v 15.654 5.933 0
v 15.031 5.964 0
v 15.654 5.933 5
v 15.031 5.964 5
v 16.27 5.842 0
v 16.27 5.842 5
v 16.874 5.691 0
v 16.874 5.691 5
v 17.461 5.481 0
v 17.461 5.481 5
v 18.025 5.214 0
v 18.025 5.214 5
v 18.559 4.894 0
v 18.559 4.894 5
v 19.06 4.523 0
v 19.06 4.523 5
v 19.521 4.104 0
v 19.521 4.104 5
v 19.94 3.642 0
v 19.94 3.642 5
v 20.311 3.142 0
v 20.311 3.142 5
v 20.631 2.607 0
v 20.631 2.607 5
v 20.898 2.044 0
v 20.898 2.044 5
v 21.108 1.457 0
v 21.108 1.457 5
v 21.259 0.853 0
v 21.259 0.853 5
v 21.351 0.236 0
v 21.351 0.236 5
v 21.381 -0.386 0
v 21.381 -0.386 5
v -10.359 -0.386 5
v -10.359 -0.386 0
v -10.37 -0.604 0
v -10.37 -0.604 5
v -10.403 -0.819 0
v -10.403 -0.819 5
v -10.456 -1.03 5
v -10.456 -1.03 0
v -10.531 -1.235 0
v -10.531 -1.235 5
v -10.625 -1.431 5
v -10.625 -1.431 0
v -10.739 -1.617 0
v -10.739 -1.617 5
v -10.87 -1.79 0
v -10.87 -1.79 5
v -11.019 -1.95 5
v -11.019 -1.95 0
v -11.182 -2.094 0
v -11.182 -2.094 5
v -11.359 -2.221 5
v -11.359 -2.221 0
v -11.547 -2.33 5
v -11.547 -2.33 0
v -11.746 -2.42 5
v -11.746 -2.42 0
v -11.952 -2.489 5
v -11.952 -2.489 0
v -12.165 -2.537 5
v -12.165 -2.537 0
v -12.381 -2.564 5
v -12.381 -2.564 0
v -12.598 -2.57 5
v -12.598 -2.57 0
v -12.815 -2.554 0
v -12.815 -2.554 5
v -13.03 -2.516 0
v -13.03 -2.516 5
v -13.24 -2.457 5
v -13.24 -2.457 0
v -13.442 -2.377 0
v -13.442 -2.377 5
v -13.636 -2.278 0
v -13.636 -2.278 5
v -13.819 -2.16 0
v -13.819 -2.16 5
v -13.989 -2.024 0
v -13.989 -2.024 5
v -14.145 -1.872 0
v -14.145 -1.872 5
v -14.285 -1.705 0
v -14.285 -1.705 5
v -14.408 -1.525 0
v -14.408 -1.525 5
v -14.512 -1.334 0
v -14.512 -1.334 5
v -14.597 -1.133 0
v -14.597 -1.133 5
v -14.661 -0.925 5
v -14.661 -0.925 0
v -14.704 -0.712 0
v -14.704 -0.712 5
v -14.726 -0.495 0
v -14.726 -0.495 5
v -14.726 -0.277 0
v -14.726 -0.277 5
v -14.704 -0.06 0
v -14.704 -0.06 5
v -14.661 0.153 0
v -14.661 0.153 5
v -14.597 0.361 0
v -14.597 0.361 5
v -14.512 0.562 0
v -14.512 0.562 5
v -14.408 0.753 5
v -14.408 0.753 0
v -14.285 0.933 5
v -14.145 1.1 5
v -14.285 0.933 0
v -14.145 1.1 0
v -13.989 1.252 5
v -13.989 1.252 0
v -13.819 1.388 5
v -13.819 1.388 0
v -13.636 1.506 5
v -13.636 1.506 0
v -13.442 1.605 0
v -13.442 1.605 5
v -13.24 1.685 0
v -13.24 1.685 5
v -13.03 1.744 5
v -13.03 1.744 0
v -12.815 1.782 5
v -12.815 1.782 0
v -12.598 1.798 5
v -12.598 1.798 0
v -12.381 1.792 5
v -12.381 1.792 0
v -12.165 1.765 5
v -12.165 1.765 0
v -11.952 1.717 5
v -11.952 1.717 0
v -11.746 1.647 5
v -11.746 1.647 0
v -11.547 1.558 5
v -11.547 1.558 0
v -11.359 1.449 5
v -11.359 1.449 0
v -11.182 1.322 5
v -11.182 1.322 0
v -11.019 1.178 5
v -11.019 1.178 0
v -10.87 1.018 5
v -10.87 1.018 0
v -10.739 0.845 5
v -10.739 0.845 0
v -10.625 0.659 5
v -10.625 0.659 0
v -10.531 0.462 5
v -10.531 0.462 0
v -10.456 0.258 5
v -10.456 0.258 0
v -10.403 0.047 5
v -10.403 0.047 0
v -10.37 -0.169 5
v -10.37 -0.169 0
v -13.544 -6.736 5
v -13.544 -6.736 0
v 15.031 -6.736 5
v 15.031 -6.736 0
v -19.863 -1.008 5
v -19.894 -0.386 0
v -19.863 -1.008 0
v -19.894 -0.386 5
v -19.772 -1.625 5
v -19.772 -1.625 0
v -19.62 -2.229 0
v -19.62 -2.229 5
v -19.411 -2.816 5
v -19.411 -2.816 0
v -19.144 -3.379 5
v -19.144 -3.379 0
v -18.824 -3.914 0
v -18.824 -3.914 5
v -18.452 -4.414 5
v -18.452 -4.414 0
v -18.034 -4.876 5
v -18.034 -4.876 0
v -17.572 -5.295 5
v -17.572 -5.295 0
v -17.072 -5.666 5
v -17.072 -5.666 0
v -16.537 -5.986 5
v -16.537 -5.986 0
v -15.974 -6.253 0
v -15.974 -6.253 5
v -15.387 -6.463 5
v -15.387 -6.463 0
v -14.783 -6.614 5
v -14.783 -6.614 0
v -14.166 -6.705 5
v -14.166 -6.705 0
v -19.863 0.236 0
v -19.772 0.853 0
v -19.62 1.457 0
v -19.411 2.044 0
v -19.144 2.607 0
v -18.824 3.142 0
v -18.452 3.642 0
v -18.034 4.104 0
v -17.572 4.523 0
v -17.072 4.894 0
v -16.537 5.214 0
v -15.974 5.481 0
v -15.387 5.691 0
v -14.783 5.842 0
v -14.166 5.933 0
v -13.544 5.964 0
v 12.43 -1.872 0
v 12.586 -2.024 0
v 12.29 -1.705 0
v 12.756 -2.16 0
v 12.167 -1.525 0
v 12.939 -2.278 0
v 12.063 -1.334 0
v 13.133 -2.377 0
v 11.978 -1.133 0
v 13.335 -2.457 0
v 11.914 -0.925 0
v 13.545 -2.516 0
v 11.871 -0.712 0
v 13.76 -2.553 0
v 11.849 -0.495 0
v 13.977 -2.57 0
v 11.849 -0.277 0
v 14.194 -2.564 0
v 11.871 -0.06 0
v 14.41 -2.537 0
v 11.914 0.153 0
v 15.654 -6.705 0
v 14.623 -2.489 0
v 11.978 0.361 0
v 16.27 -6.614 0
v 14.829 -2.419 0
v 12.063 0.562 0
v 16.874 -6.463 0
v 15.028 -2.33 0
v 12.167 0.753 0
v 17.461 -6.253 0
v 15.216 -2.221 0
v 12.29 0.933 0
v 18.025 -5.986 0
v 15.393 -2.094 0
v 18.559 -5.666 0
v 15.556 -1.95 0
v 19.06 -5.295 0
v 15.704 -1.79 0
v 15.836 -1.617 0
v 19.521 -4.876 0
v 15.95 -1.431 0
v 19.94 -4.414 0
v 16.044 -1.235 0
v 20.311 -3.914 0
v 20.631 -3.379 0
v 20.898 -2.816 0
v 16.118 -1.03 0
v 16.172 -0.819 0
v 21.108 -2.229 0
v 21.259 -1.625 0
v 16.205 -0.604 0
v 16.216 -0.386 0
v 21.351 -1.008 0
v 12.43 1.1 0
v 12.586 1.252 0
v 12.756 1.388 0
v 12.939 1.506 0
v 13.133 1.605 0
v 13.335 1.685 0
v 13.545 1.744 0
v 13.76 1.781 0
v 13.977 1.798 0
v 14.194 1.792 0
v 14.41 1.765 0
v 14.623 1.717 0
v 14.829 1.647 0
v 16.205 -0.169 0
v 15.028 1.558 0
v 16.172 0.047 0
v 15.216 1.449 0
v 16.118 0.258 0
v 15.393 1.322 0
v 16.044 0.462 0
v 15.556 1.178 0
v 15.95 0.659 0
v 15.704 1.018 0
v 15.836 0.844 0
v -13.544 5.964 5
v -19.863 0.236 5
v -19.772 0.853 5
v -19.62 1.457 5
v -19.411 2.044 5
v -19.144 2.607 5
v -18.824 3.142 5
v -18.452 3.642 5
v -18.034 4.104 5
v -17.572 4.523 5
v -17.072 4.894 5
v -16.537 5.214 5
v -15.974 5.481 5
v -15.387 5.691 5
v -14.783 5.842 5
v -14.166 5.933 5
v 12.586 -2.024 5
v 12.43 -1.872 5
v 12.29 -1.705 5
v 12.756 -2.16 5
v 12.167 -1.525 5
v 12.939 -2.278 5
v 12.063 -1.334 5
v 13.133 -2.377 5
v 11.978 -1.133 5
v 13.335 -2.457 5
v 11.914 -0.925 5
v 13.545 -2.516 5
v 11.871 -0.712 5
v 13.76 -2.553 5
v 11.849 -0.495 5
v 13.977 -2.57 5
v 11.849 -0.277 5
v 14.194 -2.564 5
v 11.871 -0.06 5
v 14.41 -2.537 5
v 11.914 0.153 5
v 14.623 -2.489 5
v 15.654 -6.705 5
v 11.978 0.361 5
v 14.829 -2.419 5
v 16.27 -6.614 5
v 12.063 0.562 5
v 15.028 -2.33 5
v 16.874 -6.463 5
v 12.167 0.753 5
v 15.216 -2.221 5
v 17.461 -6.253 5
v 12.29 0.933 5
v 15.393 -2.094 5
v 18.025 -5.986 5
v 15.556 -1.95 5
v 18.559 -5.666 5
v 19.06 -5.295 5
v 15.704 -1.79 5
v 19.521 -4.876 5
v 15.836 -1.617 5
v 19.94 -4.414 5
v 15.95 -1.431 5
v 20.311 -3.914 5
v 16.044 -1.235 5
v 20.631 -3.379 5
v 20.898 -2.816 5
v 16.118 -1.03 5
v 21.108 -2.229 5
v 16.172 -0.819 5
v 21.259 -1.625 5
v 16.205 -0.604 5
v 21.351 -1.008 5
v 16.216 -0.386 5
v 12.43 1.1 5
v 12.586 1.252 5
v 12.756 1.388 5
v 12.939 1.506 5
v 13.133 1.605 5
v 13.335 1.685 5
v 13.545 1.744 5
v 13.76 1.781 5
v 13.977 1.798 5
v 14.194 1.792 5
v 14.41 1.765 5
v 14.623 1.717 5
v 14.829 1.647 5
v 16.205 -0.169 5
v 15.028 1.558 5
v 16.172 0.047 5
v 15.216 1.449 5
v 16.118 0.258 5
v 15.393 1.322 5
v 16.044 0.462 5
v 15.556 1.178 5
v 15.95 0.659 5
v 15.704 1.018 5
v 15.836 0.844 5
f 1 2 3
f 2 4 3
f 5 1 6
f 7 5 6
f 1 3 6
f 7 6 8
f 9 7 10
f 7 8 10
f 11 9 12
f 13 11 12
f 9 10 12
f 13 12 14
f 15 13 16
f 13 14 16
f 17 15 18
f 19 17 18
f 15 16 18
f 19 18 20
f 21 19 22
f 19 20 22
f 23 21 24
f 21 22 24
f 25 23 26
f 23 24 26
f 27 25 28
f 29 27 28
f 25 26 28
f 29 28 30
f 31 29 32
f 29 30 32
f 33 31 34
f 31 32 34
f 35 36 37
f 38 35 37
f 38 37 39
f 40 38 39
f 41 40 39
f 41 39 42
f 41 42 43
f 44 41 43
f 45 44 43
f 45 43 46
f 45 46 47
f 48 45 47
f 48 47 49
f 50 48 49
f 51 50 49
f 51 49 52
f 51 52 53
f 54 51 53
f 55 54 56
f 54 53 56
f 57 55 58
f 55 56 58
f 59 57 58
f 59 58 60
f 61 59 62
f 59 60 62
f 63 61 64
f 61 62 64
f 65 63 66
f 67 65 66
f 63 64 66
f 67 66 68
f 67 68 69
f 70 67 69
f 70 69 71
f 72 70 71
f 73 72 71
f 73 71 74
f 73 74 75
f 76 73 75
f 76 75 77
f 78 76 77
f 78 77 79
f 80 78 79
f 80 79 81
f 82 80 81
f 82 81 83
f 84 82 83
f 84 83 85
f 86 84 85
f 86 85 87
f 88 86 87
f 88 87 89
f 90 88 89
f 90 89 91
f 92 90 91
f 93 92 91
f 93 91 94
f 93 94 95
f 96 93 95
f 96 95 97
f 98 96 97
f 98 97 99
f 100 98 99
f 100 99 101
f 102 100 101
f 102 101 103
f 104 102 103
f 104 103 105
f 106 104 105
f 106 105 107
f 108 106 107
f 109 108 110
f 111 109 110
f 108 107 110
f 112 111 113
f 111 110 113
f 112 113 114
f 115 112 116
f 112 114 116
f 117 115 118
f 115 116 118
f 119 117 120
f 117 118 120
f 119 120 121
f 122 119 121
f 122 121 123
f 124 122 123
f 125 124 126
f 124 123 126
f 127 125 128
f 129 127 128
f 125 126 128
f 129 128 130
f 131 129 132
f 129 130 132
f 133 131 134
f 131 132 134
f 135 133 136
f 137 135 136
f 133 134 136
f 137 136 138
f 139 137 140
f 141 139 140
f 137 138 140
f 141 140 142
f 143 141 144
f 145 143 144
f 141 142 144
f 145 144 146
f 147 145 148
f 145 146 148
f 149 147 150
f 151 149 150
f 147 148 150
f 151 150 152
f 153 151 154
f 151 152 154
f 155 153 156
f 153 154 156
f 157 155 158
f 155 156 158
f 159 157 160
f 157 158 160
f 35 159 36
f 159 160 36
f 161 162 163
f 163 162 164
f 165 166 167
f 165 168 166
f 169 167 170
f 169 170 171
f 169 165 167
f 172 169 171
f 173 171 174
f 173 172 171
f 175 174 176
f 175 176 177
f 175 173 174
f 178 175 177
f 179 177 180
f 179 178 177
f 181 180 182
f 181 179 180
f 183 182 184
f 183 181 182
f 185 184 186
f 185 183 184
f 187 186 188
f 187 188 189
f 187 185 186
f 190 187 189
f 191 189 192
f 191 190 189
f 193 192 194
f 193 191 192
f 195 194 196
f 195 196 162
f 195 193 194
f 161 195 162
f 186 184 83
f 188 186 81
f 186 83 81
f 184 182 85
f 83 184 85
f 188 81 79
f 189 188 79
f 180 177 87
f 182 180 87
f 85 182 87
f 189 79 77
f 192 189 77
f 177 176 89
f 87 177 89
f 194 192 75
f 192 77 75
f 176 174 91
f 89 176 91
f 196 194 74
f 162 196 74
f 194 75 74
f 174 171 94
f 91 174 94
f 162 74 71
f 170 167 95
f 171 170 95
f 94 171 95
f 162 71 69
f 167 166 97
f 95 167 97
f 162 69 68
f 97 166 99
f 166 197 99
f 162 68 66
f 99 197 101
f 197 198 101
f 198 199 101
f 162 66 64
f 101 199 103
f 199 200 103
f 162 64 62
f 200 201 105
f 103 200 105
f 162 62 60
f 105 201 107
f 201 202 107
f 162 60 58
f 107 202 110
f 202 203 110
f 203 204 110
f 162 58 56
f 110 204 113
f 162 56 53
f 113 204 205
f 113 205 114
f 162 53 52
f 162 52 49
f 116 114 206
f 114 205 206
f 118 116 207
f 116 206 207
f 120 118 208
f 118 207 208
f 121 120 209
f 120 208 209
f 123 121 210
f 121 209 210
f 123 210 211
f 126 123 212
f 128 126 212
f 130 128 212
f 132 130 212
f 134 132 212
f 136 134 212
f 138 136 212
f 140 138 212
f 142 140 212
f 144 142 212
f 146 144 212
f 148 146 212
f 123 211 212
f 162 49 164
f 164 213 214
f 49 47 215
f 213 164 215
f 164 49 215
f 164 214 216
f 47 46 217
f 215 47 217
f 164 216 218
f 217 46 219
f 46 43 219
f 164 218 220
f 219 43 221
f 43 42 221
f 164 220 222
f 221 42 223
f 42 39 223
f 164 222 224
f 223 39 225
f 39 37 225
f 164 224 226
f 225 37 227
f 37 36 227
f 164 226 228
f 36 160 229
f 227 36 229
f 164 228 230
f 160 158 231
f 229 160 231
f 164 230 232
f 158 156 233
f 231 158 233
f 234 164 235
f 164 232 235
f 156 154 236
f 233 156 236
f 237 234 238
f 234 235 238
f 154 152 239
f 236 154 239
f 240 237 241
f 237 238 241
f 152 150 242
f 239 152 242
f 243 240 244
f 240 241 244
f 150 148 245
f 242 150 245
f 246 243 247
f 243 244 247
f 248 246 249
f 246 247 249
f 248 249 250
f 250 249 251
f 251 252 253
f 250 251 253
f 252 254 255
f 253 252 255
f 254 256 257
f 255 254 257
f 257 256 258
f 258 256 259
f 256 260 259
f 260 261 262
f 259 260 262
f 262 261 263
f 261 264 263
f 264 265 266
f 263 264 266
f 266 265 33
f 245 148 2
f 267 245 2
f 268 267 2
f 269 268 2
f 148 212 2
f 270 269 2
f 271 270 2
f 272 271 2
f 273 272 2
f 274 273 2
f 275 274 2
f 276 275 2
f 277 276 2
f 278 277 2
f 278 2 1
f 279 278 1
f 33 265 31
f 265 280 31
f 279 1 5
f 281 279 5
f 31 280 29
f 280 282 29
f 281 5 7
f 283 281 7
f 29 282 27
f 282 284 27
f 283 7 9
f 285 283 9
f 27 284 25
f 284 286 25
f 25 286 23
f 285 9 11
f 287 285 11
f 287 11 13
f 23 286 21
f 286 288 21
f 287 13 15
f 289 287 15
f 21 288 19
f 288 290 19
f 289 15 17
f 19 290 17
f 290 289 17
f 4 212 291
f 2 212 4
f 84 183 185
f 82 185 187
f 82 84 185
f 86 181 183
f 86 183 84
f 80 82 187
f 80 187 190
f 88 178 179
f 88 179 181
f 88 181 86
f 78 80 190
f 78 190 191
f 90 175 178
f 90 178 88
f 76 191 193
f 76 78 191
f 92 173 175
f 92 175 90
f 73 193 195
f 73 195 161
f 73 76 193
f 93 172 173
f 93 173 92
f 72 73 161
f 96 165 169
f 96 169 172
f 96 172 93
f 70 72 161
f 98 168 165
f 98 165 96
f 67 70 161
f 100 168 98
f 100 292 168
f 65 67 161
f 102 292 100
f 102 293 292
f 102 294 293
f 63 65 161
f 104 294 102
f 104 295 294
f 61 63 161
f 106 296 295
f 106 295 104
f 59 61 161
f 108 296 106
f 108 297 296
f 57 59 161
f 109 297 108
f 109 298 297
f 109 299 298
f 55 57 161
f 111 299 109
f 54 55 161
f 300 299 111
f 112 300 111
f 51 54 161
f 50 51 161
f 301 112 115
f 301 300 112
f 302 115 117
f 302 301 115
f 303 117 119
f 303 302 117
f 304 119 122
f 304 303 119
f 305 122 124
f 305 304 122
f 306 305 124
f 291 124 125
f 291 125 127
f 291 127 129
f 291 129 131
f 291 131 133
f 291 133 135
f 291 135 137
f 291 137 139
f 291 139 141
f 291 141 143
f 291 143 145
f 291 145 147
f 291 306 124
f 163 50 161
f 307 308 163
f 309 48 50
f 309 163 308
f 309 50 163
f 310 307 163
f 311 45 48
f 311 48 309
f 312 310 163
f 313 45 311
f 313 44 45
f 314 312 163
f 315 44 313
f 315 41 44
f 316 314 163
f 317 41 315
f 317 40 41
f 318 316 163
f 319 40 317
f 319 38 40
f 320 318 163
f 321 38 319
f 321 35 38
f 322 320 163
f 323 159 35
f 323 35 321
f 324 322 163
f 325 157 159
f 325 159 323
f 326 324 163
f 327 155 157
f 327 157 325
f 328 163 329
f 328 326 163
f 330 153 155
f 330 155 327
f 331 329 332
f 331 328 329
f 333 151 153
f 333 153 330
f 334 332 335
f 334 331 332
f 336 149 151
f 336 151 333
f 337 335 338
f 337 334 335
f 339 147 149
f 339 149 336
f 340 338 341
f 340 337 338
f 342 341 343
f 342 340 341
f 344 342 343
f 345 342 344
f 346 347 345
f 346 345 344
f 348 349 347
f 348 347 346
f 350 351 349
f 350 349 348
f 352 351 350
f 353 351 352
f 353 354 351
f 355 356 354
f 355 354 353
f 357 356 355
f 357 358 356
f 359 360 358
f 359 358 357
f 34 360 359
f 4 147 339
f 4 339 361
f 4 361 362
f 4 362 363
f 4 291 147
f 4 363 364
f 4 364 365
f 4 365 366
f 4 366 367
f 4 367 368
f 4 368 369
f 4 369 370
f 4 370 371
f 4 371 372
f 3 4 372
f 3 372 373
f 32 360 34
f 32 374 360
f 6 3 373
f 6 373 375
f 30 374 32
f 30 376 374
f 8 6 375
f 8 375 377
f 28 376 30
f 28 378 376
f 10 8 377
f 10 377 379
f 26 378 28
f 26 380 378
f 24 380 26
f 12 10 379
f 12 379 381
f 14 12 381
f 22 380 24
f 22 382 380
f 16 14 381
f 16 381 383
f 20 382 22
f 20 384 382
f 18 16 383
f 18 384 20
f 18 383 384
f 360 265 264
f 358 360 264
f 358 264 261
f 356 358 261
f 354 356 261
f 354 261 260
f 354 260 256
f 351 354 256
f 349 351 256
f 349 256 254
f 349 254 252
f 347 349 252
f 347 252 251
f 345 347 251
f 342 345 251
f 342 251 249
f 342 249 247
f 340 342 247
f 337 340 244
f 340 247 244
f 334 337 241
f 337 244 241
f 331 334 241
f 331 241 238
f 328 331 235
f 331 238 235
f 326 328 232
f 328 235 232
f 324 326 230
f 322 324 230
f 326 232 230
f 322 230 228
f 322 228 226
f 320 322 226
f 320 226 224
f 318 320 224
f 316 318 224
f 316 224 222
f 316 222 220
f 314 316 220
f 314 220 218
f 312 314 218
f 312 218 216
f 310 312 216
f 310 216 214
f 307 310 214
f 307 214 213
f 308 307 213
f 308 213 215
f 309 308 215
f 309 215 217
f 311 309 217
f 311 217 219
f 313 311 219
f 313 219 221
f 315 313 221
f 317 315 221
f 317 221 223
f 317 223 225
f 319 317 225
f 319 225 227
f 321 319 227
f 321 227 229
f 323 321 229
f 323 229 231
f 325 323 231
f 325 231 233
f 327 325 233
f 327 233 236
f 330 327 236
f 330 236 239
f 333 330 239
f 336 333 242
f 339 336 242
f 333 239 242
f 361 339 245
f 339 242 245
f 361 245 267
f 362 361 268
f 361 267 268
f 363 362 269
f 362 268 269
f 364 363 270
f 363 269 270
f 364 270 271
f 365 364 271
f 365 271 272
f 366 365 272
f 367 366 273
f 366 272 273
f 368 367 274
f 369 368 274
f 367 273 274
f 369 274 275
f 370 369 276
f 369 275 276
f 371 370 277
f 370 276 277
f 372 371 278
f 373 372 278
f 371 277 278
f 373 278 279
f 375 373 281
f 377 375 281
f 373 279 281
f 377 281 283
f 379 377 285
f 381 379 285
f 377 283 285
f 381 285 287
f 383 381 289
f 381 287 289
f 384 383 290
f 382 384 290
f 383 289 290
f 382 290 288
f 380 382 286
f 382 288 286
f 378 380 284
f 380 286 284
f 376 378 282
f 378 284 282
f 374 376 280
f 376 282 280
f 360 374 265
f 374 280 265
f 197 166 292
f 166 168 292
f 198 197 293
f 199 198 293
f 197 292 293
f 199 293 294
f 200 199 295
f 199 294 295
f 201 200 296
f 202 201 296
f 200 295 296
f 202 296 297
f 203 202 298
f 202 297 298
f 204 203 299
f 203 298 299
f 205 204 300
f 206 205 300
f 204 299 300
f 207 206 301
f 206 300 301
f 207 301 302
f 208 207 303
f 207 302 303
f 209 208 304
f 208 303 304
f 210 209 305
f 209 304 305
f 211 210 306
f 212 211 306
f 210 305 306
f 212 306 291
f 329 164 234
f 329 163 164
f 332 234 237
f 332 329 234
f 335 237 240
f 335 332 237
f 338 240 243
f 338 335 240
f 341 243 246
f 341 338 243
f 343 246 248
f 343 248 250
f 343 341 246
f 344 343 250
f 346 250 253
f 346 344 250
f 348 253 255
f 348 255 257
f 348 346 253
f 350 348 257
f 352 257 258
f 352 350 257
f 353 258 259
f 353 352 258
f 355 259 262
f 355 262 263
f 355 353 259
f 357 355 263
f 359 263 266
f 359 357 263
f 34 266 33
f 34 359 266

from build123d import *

# Parameters (mm, degrees)
F0_W     = 41.275
F0_H     = 12.7
F1_DEPTH = 5
F2_R     = 2.1845
F2_R_2   = 2.1844
F3_DEPTH = 25
F4_R     = 6.34999


# Not quite as in the source:
# - a fillet or chamfer is up to 0.001 mm smaller than in the source, because OpenCascade refuses the exact size


with BuildPart() as f1:
    # F0 (on Top) → F1 (new body)
    with BuildSketch(Plane.XY):
        with Locations((0.7436354645, -0.3860430318)):
            Rectangle(F0_W, F0_H)
    extrude(amount=F1_DEPTH)

    # F2 (on face) → F3 (cut)
    with BuildSketch(Plane(origin=(0, 0, 0), x_dir=(1, 0, 0), z_dir=(0, 0, -1))):
        with Locations((-12.5438645355, 0.3860430318)):
            Circle(F2_R)
        with Locations((14.0311354645, 0.3860430318)):
            Circle(F2_R_2)
    extrude(amount=-F3_DEPTH, mode=Mode.SUBTRACT)

    # F4 (radius 6.35 in the source; OpenCascade refuses exactly that, so slightly less here)
    f4_edges = [f1.edges().sort_by_distance(p)[0] for p in [
        (21.381135, -6.736043, 2.5),
        (21.381135, 5.963957, 2.5),
        (-19.893865, -6.736043, 2.5),
        (-19.893865, 5.963957, 2.5),
    ]]
    fillet(f4_edges, radius=F4_R)


solid = f1.part
